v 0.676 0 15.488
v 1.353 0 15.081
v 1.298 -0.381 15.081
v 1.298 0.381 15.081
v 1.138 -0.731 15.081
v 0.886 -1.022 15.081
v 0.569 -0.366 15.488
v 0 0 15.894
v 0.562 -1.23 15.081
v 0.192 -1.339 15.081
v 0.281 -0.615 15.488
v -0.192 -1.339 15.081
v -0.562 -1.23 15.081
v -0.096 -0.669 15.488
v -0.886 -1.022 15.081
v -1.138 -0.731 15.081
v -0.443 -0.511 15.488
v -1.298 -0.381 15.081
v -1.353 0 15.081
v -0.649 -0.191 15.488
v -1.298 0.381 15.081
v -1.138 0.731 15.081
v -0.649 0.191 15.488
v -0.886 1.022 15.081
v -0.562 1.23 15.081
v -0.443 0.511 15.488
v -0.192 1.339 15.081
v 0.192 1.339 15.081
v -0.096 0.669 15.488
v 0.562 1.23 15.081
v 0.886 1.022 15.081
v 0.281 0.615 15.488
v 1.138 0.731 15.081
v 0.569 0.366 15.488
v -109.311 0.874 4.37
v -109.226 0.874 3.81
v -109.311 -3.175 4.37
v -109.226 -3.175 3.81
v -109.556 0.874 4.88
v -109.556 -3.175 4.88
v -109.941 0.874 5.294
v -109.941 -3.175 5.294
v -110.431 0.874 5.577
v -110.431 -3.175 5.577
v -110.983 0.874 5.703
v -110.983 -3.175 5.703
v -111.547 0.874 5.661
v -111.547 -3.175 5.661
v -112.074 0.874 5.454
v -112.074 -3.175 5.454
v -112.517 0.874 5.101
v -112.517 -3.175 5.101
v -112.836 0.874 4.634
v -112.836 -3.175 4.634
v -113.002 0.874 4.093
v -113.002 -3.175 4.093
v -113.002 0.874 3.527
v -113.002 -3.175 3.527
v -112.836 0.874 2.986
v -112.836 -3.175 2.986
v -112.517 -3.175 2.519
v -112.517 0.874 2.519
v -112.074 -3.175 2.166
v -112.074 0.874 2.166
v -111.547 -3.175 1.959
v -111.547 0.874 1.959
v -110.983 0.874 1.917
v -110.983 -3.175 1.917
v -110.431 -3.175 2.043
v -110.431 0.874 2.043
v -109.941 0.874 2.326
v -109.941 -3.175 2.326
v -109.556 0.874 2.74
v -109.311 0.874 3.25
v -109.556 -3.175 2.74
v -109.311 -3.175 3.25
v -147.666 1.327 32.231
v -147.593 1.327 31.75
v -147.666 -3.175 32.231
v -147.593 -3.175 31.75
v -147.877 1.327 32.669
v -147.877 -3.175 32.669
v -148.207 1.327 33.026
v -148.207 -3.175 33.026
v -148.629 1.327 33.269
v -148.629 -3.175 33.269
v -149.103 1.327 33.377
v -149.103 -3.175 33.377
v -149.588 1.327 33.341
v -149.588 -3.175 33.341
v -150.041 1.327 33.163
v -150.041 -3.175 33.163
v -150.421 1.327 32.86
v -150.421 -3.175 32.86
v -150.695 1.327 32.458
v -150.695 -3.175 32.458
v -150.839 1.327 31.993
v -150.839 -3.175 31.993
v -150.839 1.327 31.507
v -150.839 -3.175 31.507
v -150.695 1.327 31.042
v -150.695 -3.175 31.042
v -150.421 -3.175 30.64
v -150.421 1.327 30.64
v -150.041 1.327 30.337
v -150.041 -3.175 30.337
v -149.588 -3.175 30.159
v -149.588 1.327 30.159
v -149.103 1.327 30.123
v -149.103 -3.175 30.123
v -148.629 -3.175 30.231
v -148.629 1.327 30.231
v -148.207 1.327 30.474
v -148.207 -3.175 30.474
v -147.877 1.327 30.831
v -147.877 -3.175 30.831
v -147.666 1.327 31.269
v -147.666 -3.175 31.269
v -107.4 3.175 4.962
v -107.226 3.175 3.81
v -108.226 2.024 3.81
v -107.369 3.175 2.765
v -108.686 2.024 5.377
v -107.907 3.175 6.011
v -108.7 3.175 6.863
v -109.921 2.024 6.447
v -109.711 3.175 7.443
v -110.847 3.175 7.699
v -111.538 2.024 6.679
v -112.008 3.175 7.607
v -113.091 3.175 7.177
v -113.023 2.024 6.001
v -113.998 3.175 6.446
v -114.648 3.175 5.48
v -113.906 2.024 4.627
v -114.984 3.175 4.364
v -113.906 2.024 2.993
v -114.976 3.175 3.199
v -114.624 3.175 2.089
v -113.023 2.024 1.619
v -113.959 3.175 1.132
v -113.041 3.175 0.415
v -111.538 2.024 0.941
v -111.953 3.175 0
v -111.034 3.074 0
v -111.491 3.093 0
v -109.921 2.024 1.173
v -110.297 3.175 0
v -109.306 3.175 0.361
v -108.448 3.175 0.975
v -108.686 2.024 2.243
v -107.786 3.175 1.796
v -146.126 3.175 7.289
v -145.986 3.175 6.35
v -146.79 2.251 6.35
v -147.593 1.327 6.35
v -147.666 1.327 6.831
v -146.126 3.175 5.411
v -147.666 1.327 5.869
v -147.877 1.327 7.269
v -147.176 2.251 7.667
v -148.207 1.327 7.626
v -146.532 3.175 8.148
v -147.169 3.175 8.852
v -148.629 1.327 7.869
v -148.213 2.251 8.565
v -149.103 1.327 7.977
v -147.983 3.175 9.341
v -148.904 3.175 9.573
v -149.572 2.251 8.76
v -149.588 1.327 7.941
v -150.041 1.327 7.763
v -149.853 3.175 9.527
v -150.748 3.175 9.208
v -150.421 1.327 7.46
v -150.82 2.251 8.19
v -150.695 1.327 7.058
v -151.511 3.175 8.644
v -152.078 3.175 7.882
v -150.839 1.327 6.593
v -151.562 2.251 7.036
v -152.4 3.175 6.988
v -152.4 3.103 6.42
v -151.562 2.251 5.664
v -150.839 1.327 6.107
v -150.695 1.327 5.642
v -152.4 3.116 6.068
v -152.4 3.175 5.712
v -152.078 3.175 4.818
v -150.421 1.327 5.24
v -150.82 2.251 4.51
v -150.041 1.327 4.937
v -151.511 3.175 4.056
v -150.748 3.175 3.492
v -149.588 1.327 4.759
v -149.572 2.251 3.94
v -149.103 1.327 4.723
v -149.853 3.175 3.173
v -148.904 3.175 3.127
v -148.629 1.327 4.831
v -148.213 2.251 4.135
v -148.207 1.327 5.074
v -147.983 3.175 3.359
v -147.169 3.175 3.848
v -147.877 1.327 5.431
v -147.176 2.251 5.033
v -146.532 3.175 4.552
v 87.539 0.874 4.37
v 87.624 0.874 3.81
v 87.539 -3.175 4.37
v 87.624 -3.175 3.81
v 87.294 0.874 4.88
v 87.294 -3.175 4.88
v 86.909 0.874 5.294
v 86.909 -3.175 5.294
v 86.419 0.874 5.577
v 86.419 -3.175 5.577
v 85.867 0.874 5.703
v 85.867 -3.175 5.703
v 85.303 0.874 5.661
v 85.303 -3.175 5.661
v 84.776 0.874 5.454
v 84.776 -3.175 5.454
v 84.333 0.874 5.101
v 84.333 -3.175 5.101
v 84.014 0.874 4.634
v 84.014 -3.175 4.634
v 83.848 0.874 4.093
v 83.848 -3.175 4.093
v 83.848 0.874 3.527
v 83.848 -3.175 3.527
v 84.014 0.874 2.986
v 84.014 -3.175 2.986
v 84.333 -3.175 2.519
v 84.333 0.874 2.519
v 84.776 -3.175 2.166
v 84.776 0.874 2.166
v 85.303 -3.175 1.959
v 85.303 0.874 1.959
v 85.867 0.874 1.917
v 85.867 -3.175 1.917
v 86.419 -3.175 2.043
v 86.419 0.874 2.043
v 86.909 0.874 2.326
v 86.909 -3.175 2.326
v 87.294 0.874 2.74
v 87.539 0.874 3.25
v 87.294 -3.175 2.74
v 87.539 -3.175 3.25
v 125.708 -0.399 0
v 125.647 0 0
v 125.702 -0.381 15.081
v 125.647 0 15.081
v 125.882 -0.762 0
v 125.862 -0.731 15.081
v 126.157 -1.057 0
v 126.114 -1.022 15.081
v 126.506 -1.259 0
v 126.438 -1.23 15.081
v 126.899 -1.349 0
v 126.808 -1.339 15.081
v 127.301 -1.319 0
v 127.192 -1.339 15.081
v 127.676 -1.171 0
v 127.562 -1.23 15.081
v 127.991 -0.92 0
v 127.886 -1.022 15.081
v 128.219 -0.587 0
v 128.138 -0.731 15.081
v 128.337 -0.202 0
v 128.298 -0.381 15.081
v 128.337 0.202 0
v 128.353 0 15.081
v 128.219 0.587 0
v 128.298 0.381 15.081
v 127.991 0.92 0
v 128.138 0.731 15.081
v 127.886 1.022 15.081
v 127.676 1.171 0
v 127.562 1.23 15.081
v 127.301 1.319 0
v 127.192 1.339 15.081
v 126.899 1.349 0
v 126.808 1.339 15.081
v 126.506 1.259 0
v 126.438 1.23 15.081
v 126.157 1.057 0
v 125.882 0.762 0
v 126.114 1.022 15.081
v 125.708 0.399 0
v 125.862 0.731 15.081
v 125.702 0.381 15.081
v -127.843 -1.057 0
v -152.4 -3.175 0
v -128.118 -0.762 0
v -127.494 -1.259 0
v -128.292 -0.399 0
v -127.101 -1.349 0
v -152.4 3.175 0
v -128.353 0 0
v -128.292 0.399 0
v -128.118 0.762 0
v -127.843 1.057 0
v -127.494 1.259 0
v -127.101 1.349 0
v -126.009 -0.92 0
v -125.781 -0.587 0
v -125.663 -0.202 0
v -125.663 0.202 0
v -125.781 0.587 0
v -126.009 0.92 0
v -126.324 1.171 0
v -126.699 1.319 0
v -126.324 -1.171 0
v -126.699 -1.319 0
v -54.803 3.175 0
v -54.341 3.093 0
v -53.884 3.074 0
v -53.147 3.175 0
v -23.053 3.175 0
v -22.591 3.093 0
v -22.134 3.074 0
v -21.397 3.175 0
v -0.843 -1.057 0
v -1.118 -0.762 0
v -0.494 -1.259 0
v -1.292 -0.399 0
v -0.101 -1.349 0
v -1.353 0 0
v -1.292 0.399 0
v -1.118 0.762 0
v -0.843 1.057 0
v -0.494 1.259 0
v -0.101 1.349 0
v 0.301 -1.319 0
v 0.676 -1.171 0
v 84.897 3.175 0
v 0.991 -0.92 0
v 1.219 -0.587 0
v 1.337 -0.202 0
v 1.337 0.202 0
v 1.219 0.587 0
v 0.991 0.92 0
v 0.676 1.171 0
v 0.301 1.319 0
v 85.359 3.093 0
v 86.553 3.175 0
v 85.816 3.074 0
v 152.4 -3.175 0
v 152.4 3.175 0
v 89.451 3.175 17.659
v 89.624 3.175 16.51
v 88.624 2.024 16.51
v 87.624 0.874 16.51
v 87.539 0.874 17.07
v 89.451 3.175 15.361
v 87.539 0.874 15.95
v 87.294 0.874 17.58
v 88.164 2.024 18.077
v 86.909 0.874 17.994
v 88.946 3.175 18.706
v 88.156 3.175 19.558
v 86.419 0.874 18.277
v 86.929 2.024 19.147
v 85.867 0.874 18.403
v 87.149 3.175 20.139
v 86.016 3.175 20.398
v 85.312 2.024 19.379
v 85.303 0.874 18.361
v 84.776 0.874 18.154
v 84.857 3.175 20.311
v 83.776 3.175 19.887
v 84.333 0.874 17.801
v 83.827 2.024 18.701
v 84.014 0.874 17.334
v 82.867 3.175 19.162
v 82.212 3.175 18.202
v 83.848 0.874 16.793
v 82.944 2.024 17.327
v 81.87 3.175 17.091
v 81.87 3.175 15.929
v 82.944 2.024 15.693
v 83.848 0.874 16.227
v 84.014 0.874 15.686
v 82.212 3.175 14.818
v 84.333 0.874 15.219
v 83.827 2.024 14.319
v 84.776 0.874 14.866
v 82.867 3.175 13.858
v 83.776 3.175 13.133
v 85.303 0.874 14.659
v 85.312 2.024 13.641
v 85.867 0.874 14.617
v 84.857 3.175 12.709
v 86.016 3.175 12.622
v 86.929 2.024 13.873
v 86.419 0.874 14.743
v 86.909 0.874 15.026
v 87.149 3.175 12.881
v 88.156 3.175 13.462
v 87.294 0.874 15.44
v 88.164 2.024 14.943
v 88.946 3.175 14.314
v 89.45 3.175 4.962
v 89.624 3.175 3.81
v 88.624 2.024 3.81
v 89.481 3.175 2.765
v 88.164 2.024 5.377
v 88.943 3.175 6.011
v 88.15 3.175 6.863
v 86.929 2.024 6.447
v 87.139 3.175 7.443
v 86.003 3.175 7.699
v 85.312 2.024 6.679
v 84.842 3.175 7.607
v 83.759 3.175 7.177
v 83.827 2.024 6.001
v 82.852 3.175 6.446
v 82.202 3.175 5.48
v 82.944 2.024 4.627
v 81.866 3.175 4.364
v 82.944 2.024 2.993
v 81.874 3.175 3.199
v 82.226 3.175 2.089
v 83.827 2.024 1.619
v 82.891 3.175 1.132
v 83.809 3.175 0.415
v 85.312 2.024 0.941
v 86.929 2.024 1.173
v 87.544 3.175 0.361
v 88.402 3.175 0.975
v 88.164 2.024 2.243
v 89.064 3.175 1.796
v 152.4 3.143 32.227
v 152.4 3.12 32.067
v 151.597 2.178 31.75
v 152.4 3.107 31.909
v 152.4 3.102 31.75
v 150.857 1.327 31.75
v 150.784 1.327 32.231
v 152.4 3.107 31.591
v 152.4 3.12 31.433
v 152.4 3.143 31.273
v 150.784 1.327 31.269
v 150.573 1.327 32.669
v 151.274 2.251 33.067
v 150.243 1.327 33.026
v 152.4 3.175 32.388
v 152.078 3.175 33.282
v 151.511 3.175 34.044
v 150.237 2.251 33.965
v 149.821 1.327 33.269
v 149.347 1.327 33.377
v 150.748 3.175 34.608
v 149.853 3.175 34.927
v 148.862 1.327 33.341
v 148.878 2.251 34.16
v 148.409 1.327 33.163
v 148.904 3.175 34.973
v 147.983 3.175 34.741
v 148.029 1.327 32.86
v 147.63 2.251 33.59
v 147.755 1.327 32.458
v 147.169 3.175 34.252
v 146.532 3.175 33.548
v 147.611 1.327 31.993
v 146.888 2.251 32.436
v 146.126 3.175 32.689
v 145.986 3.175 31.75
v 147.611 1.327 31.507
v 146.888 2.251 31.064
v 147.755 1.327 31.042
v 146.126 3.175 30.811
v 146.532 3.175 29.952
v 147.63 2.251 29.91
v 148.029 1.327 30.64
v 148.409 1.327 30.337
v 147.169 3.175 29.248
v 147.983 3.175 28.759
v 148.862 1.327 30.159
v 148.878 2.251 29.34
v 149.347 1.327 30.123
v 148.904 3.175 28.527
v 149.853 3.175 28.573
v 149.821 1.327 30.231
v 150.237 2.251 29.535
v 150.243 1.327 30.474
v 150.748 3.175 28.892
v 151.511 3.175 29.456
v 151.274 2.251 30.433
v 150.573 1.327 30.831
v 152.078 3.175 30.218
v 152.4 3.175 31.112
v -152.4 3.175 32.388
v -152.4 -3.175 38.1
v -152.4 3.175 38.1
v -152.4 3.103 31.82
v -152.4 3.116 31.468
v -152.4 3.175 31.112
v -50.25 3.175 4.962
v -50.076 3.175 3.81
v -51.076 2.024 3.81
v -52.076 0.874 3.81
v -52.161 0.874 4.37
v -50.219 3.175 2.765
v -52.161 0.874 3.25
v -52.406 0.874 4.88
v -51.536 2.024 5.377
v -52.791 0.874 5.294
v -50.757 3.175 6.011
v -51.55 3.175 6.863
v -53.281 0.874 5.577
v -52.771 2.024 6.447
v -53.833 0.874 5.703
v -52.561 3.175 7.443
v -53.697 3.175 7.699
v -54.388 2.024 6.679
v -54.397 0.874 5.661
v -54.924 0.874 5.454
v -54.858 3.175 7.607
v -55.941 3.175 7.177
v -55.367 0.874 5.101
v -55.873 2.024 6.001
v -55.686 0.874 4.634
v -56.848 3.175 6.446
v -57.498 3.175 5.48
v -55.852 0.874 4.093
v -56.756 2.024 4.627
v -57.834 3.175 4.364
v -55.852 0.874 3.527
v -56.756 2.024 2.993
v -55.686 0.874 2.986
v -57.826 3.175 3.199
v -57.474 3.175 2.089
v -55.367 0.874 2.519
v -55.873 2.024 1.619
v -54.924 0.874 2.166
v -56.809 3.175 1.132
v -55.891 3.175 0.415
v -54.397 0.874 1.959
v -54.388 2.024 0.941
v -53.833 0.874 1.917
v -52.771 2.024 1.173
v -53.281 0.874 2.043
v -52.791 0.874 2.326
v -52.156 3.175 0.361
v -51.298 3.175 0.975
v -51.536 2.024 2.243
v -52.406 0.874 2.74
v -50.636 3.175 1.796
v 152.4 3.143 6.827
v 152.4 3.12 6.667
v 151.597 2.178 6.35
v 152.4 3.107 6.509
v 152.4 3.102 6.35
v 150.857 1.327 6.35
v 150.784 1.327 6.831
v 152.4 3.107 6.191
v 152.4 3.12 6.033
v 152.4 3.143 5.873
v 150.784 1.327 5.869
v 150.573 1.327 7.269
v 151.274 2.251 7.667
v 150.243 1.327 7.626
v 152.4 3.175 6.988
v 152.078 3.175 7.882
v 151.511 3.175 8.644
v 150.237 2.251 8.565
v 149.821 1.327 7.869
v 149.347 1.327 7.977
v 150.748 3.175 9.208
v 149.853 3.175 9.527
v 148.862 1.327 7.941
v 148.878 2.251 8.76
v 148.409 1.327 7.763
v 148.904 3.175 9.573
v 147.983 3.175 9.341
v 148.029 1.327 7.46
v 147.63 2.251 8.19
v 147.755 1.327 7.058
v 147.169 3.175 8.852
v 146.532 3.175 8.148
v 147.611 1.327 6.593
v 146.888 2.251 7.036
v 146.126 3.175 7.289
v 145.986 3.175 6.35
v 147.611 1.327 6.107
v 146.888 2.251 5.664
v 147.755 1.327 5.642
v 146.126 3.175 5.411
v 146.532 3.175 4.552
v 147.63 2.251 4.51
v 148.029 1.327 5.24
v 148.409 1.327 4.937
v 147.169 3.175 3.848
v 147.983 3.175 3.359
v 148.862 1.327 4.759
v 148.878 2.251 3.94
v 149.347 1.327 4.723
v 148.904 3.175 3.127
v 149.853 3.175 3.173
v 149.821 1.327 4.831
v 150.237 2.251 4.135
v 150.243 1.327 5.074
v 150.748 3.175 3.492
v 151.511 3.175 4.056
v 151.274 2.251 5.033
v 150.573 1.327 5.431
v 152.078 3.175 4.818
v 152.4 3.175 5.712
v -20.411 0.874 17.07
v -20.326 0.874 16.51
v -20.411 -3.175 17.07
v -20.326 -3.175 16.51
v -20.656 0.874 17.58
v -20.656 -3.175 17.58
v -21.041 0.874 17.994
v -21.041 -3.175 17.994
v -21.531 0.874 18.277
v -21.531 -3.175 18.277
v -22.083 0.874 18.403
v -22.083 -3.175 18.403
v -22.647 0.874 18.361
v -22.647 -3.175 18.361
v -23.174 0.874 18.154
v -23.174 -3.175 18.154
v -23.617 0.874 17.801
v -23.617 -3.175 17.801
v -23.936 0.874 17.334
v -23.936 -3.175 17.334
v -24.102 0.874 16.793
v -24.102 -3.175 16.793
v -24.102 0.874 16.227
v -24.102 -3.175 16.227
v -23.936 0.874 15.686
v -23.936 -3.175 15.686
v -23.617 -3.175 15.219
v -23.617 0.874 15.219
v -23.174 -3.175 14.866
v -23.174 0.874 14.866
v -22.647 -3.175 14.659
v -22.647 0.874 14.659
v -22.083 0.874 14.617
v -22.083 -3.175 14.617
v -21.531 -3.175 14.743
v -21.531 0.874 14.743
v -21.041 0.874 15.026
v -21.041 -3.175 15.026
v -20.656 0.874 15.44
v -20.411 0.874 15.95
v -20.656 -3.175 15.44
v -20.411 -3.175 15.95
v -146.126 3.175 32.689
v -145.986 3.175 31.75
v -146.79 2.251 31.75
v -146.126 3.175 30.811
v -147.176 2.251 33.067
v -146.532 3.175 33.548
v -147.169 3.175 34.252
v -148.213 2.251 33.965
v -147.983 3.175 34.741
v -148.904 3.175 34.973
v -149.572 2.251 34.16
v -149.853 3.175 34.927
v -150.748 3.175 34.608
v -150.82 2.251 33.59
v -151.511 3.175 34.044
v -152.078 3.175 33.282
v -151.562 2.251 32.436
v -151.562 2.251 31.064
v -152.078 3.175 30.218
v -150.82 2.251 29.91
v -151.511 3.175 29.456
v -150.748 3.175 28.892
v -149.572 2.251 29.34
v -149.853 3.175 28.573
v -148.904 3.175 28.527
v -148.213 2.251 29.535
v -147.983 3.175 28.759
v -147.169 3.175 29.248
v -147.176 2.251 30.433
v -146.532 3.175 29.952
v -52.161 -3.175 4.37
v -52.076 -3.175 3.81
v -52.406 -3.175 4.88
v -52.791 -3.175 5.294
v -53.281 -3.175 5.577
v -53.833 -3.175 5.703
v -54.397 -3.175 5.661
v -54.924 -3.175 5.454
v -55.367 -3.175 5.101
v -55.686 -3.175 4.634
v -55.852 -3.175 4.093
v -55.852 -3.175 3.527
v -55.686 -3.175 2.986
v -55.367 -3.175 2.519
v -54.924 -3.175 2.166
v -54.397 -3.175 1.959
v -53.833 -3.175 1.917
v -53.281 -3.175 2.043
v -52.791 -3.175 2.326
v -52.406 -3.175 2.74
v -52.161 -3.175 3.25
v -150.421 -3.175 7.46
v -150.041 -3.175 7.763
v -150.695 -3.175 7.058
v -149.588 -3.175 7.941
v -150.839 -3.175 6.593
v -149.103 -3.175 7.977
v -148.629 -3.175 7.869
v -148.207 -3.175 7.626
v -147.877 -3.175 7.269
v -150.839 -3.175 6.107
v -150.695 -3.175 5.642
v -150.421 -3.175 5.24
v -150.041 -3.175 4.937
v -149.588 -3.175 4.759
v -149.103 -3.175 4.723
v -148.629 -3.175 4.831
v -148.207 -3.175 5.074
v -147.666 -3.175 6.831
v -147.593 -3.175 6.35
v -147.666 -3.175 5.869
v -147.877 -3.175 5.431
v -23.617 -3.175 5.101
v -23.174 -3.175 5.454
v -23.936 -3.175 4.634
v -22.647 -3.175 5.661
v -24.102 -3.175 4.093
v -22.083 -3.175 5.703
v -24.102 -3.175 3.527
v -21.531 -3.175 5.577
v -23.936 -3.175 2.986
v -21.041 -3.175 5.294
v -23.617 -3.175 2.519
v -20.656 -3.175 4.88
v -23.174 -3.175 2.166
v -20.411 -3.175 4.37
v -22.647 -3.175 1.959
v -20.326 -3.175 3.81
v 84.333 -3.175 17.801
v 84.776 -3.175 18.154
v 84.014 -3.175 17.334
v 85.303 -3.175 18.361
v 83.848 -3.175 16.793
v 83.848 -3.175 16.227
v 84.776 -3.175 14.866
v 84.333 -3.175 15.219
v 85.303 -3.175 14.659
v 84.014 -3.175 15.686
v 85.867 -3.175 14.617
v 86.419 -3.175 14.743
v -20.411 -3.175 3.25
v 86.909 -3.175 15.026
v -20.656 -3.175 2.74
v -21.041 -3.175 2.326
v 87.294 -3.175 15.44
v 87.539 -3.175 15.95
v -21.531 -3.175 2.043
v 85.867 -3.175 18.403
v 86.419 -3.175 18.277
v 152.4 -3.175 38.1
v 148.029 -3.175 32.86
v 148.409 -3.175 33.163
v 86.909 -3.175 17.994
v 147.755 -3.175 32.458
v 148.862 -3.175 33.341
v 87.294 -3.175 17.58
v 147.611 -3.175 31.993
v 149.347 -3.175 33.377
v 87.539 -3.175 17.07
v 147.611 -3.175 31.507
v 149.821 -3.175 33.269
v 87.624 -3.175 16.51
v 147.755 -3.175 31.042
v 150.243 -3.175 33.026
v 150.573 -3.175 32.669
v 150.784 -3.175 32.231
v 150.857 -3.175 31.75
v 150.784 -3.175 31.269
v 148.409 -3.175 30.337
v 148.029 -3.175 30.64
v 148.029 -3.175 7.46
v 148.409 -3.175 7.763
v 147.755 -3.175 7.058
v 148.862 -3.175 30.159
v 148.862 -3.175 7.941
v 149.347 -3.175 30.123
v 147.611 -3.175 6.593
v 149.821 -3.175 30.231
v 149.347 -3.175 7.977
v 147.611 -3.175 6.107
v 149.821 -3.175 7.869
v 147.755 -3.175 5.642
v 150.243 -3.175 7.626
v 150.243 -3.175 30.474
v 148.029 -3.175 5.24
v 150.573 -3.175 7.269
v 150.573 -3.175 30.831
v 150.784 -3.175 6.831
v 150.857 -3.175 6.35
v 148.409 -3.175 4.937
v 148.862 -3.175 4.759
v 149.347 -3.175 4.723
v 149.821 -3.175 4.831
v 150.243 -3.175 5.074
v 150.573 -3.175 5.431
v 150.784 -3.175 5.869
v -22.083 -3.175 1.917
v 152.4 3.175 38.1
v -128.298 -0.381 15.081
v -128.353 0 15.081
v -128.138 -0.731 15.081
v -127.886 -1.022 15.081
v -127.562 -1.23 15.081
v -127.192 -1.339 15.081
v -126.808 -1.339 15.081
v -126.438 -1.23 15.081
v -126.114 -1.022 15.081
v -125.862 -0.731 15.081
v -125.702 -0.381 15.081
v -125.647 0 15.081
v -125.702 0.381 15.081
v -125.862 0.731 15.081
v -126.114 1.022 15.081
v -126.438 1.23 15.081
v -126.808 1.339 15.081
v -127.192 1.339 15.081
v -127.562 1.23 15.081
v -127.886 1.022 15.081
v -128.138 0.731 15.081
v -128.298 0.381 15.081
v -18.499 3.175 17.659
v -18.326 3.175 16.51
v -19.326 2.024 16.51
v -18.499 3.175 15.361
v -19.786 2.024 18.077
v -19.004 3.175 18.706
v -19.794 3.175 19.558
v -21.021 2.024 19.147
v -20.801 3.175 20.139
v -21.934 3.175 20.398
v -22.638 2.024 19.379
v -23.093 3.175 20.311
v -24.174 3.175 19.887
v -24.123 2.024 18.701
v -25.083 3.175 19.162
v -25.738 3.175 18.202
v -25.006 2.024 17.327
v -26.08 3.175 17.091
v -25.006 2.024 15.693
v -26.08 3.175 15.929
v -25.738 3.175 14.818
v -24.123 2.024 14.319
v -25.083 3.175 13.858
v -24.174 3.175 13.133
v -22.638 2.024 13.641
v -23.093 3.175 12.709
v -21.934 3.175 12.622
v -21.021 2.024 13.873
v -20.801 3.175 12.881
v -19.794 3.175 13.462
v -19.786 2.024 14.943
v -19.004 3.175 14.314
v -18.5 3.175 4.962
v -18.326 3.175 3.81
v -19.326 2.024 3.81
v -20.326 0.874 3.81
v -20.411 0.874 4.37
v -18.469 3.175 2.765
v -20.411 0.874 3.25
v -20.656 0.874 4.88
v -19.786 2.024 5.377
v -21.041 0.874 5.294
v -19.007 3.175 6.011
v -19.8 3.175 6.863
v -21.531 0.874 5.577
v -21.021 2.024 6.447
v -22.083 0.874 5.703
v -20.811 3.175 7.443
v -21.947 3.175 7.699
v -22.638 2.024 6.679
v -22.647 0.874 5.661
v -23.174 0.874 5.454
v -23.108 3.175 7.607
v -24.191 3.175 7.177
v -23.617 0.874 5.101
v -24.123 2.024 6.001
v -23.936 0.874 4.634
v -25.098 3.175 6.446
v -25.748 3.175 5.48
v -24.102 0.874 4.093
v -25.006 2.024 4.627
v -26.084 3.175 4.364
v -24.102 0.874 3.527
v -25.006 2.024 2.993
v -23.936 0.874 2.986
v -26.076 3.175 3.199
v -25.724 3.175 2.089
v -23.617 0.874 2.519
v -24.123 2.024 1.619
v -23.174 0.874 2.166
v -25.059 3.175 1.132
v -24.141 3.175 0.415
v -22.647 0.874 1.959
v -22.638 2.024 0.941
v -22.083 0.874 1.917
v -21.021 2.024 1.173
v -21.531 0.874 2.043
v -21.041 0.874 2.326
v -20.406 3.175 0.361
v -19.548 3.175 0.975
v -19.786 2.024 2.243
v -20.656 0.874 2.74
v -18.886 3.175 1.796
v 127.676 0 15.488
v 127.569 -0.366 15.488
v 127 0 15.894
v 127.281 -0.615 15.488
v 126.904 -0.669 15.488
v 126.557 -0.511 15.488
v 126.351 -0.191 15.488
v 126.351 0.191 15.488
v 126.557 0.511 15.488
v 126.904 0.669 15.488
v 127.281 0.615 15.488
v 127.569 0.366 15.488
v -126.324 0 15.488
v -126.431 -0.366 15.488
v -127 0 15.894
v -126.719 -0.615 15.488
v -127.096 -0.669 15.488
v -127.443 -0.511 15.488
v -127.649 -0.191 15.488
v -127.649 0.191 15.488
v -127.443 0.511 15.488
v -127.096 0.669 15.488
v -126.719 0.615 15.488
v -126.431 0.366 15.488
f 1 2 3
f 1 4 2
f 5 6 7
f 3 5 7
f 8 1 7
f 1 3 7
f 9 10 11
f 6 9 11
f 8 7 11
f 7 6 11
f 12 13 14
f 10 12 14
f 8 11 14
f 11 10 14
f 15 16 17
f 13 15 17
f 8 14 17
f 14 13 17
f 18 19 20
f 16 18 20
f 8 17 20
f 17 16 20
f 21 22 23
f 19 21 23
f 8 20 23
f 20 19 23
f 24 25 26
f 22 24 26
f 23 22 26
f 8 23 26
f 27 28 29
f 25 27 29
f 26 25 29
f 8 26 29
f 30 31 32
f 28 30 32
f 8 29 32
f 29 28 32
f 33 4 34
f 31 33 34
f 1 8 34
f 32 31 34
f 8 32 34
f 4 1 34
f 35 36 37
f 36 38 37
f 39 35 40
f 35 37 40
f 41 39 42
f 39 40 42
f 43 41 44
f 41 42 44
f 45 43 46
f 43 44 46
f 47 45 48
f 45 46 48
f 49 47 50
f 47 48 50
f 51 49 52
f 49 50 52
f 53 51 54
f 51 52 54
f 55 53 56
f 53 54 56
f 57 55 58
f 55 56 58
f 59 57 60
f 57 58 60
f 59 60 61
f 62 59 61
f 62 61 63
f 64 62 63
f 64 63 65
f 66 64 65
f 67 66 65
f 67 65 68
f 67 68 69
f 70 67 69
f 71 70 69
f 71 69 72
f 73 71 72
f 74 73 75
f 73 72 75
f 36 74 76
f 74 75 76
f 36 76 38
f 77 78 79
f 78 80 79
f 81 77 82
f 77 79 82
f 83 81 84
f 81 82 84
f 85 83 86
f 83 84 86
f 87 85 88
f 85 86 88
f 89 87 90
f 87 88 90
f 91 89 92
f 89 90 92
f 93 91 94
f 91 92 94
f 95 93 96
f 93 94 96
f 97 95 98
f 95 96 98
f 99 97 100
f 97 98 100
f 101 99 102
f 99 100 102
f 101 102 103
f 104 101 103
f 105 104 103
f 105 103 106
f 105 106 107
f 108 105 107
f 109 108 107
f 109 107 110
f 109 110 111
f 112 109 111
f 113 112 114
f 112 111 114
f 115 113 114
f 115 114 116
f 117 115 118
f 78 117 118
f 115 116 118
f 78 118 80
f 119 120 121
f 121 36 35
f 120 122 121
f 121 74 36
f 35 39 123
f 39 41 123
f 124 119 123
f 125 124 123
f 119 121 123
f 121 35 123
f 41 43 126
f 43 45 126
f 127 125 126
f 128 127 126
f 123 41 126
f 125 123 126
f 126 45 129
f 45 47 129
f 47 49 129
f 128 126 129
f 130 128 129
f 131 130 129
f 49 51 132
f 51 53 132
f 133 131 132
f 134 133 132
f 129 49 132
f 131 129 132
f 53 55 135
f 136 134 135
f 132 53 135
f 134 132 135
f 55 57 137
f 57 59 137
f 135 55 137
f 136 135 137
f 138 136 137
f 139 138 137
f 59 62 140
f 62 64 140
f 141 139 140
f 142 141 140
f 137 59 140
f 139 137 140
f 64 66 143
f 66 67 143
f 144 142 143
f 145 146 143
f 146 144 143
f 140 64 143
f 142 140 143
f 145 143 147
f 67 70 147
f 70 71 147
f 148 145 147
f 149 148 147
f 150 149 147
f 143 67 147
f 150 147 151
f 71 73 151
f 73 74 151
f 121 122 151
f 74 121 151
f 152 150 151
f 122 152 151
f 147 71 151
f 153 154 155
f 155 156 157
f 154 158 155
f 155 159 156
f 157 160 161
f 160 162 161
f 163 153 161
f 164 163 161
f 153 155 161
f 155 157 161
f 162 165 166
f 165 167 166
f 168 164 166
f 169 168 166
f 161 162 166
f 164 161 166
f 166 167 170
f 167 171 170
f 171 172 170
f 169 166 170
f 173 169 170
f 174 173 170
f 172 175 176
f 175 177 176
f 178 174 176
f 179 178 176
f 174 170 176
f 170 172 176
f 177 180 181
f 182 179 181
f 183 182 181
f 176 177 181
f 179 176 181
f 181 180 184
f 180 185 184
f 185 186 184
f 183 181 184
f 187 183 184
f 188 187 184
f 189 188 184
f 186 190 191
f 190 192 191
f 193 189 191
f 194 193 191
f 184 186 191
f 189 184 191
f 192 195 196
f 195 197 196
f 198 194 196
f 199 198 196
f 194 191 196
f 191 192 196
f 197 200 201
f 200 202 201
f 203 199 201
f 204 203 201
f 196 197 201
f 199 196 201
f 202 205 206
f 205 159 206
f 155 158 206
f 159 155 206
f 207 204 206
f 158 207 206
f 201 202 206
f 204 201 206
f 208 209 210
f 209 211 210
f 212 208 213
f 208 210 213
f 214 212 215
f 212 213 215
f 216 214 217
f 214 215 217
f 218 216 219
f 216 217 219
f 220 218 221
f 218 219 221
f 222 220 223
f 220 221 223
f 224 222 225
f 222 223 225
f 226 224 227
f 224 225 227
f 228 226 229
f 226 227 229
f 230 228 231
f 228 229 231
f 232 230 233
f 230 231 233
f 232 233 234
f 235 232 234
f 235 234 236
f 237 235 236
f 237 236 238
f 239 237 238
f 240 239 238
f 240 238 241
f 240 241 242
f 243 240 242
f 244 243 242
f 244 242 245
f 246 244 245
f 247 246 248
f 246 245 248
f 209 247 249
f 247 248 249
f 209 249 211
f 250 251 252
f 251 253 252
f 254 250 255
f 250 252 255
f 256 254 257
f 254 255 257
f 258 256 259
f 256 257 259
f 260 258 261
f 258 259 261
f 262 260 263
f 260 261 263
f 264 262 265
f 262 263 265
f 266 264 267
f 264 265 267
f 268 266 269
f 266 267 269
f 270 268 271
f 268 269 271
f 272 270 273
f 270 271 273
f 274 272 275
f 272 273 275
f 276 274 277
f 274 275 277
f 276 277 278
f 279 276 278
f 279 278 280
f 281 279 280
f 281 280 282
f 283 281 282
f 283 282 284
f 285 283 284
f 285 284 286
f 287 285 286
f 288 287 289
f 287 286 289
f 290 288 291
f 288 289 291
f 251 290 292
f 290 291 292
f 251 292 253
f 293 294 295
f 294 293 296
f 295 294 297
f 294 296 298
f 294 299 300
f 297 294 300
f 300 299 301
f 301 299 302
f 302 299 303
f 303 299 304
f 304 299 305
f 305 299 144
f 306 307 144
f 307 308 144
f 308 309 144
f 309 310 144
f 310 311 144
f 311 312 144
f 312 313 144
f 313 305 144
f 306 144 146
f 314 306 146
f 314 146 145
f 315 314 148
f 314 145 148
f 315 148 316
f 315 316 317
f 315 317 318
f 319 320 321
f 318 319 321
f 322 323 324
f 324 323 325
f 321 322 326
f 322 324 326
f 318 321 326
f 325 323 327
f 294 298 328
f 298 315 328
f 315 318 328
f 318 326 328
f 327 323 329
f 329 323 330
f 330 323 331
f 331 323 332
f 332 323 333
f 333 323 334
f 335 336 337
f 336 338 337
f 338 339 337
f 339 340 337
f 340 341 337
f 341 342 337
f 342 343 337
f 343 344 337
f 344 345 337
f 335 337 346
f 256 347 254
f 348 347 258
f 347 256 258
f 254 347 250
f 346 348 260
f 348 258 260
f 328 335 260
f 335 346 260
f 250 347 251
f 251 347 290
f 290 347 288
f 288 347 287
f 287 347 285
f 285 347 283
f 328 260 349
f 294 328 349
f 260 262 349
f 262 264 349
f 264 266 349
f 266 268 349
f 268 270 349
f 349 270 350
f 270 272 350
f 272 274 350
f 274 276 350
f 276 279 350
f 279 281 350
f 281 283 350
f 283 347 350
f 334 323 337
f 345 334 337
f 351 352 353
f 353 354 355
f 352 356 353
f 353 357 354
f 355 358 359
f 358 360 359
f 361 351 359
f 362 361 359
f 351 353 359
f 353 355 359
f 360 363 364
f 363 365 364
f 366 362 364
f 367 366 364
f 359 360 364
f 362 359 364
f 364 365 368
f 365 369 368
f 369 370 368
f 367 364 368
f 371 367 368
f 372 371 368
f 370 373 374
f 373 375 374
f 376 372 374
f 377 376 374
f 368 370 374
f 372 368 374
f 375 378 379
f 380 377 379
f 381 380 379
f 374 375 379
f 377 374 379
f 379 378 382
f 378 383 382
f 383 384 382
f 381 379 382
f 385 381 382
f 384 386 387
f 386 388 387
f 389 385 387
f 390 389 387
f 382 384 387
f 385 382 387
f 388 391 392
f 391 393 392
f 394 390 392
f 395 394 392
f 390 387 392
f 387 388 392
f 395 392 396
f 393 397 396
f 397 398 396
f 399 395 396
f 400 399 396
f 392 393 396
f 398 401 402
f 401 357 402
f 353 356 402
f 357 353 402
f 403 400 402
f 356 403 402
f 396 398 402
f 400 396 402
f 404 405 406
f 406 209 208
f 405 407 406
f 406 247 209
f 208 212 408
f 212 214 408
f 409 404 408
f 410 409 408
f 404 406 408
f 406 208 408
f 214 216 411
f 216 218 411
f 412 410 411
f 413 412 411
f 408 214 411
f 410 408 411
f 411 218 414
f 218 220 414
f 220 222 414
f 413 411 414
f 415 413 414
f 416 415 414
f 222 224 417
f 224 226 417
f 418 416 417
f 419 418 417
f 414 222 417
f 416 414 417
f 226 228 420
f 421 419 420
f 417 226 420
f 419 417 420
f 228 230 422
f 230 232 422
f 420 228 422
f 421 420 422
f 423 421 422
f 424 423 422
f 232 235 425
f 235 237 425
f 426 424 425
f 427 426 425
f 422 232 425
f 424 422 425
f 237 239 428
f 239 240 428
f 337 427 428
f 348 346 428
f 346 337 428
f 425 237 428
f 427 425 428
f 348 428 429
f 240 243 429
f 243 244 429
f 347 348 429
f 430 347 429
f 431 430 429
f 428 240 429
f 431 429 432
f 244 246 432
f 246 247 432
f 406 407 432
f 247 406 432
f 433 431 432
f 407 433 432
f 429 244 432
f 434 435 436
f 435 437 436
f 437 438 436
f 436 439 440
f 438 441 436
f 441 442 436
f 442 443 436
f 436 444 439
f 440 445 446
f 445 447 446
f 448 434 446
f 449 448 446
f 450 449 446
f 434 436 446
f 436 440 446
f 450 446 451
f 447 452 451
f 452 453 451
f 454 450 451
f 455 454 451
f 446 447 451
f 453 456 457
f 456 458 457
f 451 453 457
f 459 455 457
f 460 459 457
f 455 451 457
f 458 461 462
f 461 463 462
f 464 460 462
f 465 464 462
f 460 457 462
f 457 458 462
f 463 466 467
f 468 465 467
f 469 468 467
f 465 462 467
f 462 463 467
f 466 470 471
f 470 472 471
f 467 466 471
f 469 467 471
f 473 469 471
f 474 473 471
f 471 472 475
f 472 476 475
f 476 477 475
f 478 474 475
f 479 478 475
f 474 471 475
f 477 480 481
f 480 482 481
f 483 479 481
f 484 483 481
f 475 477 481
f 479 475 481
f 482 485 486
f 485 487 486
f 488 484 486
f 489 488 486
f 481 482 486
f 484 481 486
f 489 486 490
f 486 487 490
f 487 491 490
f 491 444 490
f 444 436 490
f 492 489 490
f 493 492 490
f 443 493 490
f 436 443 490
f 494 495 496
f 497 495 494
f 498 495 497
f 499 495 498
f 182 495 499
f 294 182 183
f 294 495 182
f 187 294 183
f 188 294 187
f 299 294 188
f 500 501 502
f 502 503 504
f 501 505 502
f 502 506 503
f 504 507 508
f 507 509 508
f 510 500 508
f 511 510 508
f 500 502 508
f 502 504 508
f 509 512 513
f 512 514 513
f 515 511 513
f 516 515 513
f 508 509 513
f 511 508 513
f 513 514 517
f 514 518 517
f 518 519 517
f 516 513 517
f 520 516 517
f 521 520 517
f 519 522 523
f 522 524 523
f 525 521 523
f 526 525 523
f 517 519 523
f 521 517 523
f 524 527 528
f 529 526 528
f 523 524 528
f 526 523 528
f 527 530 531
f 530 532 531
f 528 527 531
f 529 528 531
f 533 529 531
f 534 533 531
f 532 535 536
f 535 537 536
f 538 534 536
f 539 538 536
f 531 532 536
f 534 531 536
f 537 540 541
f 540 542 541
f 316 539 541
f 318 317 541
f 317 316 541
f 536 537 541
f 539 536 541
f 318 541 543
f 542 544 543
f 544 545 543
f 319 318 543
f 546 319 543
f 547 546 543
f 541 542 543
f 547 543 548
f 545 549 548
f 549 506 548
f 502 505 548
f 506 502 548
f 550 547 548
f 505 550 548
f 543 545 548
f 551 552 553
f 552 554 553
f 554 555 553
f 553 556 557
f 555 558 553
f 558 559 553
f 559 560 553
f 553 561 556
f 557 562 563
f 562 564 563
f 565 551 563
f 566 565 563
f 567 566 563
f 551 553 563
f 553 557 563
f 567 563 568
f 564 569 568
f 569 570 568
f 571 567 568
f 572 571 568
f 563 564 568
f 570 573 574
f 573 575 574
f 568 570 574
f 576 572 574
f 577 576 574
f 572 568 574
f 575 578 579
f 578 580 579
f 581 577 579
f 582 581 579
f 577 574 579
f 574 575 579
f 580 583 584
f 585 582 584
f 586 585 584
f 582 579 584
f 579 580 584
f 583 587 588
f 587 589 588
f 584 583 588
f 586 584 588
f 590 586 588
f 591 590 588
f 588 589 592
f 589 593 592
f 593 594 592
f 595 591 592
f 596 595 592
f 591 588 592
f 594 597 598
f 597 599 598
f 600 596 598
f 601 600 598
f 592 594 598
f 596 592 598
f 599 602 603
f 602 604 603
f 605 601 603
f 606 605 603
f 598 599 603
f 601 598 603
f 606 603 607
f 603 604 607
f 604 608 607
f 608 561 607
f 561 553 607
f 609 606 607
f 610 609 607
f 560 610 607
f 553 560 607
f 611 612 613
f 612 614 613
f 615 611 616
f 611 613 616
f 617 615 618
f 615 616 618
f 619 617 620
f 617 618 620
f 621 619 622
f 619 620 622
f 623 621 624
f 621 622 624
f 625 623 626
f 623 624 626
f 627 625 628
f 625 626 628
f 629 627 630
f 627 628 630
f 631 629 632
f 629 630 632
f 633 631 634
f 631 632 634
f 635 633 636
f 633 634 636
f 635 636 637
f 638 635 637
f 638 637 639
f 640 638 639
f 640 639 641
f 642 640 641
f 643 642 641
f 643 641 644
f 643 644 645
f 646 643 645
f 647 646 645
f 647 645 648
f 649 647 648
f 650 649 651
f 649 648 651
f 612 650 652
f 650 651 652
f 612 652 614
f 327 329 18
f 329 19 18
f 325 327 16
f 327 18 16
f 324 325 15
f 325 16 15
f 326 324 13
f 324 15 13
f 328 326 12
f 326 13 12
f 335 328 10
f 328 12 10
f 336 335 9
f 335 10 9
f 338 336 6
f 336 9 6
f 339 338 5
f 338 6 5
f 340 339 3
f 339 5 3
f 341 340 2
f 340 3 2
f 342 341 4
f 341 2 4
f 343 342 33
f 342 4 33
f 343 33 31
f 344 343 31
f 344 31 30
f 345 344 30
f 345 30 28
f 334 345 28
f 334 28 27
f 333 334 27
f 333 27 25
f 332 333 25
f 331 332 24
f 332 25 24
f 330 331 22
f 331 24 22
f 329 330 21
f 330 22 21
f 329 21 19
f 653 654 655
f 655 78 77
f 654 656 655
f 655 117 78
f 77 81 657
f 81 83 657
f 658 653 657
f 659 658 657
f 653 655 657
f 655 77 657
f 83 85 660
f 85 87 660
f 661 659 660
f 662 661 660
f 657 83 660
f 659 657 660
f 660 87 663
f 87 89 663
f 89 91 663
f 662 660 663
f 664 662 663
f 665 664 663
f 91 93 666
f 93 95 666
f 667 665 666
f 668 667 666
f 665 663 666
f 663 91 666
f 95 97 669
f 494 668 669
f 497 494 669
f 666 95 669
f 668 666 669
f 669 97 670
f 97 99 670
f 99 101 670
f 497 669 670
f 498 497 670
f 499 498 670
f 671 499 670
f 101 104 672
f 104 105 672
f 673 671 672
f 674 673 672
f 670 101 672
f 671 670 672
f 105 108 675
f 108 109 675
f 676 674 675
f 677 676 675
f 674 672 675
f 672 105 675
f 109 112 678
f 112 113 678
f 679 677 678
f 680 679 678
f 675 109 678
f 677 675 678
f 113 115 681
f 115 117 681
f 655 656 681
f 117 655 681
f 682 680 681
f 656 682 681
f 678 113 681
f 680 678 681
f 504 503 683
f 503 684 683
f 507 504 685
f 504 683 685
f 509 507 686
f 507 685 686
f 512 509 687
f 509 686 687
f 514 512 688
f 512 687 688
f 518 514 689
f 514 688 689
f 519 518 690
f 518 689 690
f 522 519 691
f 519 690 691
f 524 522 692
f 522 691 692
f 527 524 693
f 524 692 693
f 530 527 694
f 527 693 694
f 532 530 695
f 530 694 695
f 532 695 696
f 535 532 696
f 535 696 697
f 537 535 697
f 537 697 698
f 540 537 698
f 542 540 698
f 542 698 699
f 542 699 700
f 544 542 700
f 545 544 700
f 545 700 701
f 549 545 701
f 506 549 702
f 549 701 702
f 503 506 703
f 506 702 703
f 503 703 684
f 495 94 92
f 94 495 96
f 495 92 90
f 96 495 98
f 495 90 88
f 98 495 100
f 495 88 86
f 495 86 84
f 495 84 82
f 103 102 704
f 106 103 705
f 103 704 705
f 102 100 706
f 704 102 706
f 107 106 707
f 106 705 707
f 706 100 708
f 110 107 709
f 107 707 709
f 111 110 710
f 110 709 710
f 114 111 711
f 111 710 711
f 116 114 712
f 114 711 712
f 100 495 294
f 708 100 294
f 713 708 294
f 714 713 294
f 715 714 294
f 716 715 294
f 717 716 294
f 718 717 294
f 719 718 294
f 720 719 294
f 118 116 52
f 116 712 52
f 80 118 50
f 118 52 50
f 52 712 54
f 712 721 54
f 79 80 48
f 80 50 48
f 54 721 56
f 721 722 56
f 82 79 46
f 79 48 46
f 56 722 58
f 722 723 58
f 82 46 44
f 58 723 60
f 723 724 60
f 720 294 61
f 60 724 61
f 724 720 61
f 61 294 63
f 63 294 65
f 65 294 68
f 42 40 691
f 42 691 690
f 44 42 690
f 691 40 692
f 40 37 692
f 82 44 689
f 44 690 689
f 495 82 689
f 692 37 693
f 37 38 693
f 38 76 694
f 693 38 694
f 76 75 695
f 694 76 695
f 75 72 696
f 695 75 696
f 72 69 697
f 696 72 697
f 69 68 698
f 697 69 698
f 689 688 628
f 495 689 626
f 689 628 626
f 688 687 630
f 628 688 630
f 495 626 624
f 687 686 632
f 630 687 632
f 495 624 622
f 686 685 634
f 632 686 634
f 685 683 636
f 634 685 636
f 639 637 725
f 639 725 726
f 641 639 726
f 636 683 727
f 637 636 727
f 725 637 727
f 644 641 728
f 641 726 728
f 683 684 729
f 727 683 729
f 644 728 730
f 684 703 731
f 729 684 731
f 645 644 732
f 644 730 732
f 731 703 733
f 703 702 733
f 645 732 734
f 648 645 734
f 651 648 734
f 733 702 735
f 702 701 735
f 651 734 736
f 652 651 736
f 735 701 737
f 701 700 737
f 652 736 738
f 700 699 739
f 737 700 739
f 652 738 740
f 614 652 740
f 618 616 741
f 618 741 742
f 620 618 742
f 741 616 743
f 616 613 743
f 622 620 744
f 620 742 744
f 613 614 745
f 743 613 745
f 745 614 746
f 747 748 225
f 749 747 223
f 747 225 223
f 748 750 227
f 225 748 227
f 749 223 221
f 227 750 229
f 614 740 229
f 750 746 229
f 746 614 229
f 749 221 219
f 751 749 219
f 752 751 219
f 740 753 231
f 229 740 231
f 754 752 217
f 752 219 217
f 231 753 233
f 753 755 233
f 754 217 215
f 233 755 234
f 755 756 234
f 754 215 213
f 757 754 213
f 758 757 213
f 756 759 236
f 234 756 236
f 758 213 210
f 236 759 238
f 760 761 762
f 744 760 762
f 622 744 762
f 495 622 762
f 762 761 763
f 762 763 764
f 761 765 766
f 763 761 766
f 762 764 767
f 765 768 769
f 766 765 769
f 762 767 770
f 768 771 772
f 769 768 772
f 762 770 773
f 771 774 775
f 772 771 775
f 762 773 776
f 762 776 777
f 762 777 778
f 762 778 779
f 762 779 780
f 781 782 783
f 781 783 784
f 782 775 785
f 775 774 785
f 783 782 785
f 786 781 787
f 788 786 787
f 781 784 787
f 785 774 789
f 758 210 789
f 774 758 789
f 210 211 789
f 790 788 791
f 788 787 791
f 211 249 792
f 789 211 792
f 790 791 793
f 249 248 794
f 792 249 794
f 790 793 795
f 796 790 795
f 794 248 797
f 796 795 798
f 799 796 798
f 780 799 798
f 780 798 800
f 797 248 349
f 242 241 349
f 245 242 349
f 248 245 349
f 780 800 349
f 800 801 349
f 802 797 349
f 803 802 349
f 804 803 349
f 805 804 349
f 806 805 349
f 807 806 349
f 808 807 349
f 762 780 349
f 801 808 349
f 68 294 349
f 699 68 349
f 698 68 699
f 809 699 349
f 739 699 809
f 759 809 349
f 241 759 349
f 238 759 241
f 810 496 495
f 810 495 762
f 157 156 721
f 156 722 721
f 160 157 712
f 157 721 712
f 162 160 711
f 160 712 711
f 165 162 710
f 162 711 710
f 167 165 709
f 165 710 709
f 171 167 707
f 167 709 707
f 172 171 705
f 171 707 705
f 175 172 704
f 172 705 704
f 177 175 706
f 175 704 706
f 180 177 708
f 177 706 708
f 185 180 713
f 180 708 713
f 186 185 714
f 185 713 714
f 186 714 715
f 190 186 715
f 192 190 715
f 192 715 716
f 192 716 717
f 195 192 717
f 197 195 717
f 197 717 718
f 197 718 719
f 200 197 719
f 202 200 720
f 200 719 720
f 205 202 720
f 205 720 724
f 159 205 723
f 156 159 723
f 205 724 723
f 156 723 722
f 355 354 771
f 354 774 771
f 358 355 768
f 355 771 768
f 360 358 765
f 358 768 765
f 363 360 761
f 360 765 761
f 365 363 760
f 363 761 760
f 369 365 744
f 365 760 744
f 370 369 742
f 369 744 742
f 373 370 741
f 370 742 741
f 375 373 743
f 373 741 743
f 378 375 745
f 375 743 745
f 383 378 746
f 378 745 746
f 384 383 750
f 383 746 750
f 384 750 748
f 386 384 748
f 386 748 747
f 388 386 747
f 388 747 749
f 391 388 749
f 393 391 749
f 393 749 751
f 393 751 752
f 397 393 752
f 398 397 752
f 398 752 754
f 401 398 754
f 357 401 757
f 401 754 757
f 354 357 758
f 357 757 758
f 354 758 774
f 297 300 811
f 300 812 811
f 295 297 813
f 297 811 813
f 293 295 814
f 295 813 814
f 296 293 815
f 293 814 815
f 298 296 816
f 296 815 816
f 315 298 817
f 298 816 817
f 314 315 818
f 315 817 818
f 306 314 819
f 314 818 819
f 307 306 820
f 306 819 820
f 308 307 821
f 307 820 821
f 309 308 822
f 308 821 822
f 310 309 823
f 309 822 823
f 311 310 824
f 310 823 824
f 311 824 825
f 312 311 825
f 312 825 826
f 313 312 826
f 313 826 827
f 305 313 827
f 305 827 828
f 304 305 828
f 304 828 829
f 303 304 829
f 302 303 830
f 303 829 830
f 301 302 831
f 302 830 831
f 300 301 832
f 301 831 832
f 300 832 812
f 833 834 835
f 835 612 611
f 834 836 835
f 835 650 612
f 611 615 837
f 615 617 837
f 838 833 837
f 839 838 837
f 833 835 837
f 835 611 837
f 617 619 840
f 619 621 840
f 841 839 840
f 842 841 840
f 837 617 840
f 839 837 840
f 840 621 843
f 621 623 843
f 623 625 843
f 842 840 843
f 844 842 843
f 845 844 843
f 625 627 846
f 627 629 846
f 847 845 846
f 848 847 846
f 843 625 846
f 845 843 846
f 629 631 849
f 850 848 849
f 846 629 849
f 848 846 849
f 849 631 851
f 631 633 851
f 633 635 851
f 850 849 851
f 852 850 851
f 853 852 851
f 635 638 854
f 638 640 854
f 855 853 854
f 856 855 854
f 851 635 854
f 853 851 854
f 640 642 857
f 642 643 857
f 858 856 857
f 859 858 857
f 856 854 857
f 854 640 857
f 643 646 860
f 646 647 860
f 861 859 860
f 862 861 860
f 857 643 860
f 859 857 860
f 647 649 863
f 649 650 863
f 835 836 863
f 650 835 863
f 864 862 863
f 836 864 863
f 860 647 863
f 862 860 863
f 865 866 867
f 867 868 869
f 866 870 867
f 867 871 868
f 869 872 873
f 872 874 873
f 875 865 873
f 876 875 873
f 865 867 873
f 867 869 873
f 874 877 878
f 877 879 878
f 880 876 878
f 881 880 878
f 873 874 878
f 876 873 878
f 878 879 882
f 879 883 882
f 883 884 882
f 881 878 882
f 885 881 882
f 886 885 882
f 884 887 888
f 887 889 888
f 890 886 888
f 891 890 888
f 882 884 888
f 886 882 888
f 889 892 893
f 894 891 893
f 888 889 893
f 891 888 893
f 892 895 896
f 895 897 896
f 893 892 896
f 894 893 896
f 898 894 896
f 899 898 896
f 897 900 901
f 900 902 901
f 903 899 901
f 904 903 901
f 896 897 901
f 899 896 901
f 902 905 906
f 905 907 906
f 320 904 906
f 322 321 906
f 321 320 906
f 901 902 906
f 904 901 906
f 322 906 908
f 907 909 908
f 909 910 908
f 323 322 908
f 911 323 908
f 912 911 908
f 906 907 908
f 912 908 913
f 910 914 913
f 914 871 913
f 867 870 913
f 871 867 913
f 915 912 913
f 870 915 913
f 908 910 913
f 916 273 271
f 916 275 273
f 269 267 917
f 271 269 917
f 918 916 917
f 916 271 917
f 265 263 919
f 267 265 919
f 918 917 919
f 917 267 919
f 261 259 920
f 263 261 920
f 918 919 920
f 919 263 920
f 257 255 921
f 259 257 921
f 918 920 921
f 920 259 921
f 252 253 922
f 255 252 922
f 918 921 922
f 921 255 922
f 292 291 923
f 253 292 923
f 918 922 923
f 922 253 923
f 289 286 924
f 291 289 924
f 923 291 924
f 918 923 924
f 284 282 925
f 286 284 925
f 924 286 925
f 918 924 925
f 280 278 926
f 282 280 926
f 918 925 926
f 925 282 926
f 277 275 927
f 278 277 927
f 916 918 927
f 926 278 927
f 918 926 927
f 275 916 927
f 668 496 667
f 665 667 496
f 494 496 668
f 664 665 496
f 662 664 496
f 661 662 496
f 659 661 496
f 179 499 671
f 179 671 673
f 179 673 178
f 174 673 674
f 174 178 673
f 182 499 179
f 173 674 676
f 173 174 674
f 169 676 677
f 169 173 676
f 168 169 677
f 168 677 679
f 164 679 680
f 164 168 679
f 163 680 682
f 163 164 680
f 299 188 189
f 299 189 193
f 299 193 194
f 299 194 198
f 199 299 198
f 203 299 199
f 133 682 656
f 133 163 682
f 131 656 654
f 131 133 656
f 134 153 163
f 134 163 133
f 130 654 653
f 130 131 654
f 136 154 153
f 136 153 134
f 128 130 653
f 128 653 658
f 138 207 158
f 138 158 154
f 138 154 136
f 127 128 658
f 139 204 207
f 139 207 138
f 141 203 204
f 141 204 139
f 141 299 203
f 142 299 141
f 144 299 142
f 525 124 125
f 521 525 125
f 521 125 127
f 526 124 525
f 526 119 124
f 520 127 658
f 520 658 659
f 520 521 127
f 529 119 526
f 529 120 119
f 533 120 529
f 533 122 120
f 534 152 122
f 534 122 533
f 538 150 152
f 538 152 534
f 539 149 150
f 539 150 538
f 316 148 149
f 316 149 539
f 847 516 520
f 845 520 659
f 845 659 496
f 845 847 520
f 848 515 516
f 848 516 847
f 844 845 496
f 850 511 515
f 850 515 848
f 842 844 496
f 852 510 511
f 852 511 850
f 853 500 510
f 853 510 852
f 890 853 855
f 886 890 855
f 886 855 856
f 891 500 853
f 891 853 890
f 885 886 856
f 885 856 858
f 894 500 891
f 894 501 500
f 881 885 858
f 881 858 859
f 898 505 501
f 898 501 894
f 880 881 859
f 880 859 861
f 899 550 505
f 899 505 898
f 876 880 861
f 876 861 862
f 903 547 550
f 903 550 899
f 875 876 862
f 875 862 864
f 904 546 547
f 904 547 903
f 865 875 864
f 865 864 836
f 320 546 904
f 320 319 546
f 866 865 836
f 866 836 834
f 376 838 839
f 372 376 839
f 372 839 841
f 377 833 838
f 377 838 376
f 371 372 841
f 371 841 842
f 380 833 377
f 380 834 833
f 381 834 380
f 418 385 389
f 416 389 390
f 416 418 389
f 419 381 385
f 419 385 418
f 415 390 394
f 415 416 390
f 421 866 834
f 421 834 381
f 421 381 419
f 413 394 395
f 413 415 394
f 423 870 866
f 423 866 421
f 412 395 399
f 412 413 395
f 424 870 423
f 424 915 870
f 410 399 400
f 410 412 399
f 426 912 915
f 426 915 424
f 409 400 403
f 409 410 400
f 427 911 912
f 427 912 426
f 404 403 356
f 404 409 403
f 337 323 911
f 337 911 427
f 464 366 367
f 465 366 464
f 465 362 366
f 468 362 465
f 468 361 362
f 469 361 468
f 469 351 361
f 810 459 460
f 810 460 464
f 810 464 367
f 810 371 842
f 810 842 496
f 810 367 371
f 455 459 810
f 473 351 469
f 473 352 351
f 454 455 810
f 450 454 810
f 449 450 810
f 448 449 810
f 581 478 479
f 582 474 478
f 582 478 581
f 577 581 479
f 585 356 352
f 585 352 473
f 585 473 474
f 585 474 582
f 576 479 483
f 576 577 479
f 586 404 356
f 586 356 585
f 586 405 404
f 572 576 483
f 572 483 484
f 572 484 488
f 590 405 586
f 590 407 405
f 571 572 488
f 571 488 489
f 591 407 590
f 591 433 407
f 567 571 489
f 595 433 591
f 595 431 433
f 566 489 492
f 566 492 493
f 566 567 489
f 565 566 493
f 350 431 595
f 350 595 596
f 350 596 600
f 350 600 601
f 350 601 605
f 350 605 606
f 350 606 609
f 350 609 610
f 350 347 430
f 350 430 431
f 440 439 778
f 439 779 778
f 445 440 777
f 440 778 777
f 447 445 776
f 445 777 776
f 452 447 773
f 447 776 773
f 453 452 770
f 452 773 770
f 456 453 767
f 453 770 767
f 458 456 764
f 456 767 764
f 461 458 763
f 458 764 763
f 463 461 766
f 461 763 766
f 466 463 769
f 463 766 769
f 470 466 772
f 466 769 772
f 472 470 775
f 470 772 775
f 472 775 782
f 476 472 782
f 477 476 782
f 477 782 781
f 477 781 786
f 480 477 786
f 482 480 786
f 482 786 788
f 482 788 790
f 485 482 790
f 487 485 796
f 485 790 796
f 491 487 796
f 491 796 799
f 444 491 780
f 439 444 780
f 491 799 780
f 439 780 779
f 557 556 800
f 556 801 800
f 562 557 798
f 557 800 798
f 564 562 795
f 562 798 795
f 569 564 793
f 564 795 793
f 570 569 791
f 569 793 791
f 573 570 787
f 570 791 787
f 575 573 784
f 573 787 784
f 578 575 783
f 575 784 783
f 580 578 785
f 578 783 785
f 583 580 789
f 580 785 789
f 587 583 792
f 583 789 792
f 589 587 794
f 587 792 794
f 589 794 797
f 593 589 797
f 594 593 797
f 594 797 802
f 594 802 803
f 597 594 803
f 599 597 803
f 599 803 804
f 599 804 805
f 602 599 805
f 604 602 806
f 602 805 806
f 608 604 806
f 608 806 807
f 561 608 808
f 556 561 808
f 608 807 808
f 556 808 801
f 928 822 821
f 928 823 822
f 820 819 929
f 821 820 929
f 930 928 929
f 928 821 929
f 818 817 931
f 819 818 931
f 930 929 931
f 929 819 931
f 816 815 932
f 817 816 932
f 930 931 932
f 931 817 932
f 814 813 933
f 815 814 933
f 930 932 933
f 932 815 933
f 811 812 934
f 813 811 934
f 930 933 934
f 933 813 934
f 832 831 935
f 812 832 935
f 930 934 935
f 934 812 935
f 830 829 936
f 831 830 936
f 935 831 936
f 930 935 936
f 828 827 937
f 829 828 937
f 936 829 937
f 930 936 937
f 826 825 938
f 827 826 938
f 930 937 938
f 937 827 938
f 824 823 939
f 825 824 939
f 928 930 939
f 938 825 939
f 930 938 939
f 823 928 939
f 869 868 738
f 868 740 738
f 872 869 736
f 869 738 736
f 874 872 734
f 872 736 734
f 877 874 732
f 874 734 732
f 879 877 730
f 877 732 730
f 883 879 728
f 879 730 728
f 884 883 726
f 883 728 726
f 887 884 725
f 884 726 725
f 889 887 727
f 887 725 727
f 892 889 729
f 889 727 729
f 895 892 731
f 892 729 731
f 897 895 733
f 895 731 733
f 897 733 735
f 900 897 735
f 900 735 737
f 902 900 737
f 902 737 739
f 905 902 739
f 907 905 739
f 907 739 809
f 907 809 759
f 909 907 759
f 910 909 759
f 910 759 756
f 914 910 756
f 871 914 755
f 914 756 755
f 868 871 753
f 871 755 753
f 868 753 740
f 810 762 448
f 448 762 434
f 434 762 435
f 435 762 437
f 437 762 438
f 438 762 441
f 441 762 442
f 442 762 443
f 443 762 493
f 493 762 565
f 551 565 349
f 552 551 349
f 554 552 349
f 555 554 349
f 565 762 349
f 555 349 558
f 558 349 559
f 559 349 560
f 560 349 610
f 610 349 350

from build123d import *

# Parameters (mm, degrees)
F0_W           = 304.8
F0_H           = 6.35
F1_DEPTH       = 38.1
F3_D           = 2.7051
F3_DEPTH       = 15.08125
F3_TIP         = 0.8126940303
F5_D           = 3.2639
F5_CSINK_D     = 6.477
F5_CSINK_ANGLE = 82
F7_D           = 3.7973
F7_CSINK_D     = 7.7978
F7_CSINK_ANGLE = 82


with BuildPart() as f1:
    # F0 (on Top) → F1 (new body)
    with BuildSketch(Plane.XY):
        Rectangle(F0_W, F0_H)
    extrude(amount=F1_DEPTH)

    # F3
    with Locations(Plane(origin=(0, 0, 0), x_dir=(1, 0, 0), z_dir=(0, 0, -1))):
        with Locations((-127, 0), (127, 0), (0, 0)):
            Hole(F3_D / 2, depth=F3_DEPTH)
            with Locations((0, 0, -(F3_DEPTH + F3_TIP / 2))):  # 118° drill point
                Cone(0, F3_D / 2, F3_TIP, mode=Mode.SUBTRACT)

    # F5 (through all)
    with Locations(Plane(origin=(0, 3.175, 0), x_dir=(-1, 0, 0), z_dir=(0, 1, 0))):
        with Locations((149.225, 31.75), (149.225, 6.35), (-149.225, 31.75), (-149.225, 6.35)):
            CounterSinkHole(F5_D / 2, F5_CSINK_D / 2, counter_sink_angle=F5_CSINK_ANGLE)

    # F7 (through all)
    with Locations(Plane(origin=(0, 3.175, 0), x_dir=(-1, 0, 0), z_dir=(0, 1, 0))):
        with Locations((-85.725, 3.81), (22.225, 3.81), (53.975, 3.81), (111.125, 3.81), (-85.725, 16.51), (22.225, 16.51)):
            CounterSinkHole(F7_D / 2, F7_CSINK_D / 2, counter_sink_angle=F7_CSINK_ANGLE)


solid = f1.part
